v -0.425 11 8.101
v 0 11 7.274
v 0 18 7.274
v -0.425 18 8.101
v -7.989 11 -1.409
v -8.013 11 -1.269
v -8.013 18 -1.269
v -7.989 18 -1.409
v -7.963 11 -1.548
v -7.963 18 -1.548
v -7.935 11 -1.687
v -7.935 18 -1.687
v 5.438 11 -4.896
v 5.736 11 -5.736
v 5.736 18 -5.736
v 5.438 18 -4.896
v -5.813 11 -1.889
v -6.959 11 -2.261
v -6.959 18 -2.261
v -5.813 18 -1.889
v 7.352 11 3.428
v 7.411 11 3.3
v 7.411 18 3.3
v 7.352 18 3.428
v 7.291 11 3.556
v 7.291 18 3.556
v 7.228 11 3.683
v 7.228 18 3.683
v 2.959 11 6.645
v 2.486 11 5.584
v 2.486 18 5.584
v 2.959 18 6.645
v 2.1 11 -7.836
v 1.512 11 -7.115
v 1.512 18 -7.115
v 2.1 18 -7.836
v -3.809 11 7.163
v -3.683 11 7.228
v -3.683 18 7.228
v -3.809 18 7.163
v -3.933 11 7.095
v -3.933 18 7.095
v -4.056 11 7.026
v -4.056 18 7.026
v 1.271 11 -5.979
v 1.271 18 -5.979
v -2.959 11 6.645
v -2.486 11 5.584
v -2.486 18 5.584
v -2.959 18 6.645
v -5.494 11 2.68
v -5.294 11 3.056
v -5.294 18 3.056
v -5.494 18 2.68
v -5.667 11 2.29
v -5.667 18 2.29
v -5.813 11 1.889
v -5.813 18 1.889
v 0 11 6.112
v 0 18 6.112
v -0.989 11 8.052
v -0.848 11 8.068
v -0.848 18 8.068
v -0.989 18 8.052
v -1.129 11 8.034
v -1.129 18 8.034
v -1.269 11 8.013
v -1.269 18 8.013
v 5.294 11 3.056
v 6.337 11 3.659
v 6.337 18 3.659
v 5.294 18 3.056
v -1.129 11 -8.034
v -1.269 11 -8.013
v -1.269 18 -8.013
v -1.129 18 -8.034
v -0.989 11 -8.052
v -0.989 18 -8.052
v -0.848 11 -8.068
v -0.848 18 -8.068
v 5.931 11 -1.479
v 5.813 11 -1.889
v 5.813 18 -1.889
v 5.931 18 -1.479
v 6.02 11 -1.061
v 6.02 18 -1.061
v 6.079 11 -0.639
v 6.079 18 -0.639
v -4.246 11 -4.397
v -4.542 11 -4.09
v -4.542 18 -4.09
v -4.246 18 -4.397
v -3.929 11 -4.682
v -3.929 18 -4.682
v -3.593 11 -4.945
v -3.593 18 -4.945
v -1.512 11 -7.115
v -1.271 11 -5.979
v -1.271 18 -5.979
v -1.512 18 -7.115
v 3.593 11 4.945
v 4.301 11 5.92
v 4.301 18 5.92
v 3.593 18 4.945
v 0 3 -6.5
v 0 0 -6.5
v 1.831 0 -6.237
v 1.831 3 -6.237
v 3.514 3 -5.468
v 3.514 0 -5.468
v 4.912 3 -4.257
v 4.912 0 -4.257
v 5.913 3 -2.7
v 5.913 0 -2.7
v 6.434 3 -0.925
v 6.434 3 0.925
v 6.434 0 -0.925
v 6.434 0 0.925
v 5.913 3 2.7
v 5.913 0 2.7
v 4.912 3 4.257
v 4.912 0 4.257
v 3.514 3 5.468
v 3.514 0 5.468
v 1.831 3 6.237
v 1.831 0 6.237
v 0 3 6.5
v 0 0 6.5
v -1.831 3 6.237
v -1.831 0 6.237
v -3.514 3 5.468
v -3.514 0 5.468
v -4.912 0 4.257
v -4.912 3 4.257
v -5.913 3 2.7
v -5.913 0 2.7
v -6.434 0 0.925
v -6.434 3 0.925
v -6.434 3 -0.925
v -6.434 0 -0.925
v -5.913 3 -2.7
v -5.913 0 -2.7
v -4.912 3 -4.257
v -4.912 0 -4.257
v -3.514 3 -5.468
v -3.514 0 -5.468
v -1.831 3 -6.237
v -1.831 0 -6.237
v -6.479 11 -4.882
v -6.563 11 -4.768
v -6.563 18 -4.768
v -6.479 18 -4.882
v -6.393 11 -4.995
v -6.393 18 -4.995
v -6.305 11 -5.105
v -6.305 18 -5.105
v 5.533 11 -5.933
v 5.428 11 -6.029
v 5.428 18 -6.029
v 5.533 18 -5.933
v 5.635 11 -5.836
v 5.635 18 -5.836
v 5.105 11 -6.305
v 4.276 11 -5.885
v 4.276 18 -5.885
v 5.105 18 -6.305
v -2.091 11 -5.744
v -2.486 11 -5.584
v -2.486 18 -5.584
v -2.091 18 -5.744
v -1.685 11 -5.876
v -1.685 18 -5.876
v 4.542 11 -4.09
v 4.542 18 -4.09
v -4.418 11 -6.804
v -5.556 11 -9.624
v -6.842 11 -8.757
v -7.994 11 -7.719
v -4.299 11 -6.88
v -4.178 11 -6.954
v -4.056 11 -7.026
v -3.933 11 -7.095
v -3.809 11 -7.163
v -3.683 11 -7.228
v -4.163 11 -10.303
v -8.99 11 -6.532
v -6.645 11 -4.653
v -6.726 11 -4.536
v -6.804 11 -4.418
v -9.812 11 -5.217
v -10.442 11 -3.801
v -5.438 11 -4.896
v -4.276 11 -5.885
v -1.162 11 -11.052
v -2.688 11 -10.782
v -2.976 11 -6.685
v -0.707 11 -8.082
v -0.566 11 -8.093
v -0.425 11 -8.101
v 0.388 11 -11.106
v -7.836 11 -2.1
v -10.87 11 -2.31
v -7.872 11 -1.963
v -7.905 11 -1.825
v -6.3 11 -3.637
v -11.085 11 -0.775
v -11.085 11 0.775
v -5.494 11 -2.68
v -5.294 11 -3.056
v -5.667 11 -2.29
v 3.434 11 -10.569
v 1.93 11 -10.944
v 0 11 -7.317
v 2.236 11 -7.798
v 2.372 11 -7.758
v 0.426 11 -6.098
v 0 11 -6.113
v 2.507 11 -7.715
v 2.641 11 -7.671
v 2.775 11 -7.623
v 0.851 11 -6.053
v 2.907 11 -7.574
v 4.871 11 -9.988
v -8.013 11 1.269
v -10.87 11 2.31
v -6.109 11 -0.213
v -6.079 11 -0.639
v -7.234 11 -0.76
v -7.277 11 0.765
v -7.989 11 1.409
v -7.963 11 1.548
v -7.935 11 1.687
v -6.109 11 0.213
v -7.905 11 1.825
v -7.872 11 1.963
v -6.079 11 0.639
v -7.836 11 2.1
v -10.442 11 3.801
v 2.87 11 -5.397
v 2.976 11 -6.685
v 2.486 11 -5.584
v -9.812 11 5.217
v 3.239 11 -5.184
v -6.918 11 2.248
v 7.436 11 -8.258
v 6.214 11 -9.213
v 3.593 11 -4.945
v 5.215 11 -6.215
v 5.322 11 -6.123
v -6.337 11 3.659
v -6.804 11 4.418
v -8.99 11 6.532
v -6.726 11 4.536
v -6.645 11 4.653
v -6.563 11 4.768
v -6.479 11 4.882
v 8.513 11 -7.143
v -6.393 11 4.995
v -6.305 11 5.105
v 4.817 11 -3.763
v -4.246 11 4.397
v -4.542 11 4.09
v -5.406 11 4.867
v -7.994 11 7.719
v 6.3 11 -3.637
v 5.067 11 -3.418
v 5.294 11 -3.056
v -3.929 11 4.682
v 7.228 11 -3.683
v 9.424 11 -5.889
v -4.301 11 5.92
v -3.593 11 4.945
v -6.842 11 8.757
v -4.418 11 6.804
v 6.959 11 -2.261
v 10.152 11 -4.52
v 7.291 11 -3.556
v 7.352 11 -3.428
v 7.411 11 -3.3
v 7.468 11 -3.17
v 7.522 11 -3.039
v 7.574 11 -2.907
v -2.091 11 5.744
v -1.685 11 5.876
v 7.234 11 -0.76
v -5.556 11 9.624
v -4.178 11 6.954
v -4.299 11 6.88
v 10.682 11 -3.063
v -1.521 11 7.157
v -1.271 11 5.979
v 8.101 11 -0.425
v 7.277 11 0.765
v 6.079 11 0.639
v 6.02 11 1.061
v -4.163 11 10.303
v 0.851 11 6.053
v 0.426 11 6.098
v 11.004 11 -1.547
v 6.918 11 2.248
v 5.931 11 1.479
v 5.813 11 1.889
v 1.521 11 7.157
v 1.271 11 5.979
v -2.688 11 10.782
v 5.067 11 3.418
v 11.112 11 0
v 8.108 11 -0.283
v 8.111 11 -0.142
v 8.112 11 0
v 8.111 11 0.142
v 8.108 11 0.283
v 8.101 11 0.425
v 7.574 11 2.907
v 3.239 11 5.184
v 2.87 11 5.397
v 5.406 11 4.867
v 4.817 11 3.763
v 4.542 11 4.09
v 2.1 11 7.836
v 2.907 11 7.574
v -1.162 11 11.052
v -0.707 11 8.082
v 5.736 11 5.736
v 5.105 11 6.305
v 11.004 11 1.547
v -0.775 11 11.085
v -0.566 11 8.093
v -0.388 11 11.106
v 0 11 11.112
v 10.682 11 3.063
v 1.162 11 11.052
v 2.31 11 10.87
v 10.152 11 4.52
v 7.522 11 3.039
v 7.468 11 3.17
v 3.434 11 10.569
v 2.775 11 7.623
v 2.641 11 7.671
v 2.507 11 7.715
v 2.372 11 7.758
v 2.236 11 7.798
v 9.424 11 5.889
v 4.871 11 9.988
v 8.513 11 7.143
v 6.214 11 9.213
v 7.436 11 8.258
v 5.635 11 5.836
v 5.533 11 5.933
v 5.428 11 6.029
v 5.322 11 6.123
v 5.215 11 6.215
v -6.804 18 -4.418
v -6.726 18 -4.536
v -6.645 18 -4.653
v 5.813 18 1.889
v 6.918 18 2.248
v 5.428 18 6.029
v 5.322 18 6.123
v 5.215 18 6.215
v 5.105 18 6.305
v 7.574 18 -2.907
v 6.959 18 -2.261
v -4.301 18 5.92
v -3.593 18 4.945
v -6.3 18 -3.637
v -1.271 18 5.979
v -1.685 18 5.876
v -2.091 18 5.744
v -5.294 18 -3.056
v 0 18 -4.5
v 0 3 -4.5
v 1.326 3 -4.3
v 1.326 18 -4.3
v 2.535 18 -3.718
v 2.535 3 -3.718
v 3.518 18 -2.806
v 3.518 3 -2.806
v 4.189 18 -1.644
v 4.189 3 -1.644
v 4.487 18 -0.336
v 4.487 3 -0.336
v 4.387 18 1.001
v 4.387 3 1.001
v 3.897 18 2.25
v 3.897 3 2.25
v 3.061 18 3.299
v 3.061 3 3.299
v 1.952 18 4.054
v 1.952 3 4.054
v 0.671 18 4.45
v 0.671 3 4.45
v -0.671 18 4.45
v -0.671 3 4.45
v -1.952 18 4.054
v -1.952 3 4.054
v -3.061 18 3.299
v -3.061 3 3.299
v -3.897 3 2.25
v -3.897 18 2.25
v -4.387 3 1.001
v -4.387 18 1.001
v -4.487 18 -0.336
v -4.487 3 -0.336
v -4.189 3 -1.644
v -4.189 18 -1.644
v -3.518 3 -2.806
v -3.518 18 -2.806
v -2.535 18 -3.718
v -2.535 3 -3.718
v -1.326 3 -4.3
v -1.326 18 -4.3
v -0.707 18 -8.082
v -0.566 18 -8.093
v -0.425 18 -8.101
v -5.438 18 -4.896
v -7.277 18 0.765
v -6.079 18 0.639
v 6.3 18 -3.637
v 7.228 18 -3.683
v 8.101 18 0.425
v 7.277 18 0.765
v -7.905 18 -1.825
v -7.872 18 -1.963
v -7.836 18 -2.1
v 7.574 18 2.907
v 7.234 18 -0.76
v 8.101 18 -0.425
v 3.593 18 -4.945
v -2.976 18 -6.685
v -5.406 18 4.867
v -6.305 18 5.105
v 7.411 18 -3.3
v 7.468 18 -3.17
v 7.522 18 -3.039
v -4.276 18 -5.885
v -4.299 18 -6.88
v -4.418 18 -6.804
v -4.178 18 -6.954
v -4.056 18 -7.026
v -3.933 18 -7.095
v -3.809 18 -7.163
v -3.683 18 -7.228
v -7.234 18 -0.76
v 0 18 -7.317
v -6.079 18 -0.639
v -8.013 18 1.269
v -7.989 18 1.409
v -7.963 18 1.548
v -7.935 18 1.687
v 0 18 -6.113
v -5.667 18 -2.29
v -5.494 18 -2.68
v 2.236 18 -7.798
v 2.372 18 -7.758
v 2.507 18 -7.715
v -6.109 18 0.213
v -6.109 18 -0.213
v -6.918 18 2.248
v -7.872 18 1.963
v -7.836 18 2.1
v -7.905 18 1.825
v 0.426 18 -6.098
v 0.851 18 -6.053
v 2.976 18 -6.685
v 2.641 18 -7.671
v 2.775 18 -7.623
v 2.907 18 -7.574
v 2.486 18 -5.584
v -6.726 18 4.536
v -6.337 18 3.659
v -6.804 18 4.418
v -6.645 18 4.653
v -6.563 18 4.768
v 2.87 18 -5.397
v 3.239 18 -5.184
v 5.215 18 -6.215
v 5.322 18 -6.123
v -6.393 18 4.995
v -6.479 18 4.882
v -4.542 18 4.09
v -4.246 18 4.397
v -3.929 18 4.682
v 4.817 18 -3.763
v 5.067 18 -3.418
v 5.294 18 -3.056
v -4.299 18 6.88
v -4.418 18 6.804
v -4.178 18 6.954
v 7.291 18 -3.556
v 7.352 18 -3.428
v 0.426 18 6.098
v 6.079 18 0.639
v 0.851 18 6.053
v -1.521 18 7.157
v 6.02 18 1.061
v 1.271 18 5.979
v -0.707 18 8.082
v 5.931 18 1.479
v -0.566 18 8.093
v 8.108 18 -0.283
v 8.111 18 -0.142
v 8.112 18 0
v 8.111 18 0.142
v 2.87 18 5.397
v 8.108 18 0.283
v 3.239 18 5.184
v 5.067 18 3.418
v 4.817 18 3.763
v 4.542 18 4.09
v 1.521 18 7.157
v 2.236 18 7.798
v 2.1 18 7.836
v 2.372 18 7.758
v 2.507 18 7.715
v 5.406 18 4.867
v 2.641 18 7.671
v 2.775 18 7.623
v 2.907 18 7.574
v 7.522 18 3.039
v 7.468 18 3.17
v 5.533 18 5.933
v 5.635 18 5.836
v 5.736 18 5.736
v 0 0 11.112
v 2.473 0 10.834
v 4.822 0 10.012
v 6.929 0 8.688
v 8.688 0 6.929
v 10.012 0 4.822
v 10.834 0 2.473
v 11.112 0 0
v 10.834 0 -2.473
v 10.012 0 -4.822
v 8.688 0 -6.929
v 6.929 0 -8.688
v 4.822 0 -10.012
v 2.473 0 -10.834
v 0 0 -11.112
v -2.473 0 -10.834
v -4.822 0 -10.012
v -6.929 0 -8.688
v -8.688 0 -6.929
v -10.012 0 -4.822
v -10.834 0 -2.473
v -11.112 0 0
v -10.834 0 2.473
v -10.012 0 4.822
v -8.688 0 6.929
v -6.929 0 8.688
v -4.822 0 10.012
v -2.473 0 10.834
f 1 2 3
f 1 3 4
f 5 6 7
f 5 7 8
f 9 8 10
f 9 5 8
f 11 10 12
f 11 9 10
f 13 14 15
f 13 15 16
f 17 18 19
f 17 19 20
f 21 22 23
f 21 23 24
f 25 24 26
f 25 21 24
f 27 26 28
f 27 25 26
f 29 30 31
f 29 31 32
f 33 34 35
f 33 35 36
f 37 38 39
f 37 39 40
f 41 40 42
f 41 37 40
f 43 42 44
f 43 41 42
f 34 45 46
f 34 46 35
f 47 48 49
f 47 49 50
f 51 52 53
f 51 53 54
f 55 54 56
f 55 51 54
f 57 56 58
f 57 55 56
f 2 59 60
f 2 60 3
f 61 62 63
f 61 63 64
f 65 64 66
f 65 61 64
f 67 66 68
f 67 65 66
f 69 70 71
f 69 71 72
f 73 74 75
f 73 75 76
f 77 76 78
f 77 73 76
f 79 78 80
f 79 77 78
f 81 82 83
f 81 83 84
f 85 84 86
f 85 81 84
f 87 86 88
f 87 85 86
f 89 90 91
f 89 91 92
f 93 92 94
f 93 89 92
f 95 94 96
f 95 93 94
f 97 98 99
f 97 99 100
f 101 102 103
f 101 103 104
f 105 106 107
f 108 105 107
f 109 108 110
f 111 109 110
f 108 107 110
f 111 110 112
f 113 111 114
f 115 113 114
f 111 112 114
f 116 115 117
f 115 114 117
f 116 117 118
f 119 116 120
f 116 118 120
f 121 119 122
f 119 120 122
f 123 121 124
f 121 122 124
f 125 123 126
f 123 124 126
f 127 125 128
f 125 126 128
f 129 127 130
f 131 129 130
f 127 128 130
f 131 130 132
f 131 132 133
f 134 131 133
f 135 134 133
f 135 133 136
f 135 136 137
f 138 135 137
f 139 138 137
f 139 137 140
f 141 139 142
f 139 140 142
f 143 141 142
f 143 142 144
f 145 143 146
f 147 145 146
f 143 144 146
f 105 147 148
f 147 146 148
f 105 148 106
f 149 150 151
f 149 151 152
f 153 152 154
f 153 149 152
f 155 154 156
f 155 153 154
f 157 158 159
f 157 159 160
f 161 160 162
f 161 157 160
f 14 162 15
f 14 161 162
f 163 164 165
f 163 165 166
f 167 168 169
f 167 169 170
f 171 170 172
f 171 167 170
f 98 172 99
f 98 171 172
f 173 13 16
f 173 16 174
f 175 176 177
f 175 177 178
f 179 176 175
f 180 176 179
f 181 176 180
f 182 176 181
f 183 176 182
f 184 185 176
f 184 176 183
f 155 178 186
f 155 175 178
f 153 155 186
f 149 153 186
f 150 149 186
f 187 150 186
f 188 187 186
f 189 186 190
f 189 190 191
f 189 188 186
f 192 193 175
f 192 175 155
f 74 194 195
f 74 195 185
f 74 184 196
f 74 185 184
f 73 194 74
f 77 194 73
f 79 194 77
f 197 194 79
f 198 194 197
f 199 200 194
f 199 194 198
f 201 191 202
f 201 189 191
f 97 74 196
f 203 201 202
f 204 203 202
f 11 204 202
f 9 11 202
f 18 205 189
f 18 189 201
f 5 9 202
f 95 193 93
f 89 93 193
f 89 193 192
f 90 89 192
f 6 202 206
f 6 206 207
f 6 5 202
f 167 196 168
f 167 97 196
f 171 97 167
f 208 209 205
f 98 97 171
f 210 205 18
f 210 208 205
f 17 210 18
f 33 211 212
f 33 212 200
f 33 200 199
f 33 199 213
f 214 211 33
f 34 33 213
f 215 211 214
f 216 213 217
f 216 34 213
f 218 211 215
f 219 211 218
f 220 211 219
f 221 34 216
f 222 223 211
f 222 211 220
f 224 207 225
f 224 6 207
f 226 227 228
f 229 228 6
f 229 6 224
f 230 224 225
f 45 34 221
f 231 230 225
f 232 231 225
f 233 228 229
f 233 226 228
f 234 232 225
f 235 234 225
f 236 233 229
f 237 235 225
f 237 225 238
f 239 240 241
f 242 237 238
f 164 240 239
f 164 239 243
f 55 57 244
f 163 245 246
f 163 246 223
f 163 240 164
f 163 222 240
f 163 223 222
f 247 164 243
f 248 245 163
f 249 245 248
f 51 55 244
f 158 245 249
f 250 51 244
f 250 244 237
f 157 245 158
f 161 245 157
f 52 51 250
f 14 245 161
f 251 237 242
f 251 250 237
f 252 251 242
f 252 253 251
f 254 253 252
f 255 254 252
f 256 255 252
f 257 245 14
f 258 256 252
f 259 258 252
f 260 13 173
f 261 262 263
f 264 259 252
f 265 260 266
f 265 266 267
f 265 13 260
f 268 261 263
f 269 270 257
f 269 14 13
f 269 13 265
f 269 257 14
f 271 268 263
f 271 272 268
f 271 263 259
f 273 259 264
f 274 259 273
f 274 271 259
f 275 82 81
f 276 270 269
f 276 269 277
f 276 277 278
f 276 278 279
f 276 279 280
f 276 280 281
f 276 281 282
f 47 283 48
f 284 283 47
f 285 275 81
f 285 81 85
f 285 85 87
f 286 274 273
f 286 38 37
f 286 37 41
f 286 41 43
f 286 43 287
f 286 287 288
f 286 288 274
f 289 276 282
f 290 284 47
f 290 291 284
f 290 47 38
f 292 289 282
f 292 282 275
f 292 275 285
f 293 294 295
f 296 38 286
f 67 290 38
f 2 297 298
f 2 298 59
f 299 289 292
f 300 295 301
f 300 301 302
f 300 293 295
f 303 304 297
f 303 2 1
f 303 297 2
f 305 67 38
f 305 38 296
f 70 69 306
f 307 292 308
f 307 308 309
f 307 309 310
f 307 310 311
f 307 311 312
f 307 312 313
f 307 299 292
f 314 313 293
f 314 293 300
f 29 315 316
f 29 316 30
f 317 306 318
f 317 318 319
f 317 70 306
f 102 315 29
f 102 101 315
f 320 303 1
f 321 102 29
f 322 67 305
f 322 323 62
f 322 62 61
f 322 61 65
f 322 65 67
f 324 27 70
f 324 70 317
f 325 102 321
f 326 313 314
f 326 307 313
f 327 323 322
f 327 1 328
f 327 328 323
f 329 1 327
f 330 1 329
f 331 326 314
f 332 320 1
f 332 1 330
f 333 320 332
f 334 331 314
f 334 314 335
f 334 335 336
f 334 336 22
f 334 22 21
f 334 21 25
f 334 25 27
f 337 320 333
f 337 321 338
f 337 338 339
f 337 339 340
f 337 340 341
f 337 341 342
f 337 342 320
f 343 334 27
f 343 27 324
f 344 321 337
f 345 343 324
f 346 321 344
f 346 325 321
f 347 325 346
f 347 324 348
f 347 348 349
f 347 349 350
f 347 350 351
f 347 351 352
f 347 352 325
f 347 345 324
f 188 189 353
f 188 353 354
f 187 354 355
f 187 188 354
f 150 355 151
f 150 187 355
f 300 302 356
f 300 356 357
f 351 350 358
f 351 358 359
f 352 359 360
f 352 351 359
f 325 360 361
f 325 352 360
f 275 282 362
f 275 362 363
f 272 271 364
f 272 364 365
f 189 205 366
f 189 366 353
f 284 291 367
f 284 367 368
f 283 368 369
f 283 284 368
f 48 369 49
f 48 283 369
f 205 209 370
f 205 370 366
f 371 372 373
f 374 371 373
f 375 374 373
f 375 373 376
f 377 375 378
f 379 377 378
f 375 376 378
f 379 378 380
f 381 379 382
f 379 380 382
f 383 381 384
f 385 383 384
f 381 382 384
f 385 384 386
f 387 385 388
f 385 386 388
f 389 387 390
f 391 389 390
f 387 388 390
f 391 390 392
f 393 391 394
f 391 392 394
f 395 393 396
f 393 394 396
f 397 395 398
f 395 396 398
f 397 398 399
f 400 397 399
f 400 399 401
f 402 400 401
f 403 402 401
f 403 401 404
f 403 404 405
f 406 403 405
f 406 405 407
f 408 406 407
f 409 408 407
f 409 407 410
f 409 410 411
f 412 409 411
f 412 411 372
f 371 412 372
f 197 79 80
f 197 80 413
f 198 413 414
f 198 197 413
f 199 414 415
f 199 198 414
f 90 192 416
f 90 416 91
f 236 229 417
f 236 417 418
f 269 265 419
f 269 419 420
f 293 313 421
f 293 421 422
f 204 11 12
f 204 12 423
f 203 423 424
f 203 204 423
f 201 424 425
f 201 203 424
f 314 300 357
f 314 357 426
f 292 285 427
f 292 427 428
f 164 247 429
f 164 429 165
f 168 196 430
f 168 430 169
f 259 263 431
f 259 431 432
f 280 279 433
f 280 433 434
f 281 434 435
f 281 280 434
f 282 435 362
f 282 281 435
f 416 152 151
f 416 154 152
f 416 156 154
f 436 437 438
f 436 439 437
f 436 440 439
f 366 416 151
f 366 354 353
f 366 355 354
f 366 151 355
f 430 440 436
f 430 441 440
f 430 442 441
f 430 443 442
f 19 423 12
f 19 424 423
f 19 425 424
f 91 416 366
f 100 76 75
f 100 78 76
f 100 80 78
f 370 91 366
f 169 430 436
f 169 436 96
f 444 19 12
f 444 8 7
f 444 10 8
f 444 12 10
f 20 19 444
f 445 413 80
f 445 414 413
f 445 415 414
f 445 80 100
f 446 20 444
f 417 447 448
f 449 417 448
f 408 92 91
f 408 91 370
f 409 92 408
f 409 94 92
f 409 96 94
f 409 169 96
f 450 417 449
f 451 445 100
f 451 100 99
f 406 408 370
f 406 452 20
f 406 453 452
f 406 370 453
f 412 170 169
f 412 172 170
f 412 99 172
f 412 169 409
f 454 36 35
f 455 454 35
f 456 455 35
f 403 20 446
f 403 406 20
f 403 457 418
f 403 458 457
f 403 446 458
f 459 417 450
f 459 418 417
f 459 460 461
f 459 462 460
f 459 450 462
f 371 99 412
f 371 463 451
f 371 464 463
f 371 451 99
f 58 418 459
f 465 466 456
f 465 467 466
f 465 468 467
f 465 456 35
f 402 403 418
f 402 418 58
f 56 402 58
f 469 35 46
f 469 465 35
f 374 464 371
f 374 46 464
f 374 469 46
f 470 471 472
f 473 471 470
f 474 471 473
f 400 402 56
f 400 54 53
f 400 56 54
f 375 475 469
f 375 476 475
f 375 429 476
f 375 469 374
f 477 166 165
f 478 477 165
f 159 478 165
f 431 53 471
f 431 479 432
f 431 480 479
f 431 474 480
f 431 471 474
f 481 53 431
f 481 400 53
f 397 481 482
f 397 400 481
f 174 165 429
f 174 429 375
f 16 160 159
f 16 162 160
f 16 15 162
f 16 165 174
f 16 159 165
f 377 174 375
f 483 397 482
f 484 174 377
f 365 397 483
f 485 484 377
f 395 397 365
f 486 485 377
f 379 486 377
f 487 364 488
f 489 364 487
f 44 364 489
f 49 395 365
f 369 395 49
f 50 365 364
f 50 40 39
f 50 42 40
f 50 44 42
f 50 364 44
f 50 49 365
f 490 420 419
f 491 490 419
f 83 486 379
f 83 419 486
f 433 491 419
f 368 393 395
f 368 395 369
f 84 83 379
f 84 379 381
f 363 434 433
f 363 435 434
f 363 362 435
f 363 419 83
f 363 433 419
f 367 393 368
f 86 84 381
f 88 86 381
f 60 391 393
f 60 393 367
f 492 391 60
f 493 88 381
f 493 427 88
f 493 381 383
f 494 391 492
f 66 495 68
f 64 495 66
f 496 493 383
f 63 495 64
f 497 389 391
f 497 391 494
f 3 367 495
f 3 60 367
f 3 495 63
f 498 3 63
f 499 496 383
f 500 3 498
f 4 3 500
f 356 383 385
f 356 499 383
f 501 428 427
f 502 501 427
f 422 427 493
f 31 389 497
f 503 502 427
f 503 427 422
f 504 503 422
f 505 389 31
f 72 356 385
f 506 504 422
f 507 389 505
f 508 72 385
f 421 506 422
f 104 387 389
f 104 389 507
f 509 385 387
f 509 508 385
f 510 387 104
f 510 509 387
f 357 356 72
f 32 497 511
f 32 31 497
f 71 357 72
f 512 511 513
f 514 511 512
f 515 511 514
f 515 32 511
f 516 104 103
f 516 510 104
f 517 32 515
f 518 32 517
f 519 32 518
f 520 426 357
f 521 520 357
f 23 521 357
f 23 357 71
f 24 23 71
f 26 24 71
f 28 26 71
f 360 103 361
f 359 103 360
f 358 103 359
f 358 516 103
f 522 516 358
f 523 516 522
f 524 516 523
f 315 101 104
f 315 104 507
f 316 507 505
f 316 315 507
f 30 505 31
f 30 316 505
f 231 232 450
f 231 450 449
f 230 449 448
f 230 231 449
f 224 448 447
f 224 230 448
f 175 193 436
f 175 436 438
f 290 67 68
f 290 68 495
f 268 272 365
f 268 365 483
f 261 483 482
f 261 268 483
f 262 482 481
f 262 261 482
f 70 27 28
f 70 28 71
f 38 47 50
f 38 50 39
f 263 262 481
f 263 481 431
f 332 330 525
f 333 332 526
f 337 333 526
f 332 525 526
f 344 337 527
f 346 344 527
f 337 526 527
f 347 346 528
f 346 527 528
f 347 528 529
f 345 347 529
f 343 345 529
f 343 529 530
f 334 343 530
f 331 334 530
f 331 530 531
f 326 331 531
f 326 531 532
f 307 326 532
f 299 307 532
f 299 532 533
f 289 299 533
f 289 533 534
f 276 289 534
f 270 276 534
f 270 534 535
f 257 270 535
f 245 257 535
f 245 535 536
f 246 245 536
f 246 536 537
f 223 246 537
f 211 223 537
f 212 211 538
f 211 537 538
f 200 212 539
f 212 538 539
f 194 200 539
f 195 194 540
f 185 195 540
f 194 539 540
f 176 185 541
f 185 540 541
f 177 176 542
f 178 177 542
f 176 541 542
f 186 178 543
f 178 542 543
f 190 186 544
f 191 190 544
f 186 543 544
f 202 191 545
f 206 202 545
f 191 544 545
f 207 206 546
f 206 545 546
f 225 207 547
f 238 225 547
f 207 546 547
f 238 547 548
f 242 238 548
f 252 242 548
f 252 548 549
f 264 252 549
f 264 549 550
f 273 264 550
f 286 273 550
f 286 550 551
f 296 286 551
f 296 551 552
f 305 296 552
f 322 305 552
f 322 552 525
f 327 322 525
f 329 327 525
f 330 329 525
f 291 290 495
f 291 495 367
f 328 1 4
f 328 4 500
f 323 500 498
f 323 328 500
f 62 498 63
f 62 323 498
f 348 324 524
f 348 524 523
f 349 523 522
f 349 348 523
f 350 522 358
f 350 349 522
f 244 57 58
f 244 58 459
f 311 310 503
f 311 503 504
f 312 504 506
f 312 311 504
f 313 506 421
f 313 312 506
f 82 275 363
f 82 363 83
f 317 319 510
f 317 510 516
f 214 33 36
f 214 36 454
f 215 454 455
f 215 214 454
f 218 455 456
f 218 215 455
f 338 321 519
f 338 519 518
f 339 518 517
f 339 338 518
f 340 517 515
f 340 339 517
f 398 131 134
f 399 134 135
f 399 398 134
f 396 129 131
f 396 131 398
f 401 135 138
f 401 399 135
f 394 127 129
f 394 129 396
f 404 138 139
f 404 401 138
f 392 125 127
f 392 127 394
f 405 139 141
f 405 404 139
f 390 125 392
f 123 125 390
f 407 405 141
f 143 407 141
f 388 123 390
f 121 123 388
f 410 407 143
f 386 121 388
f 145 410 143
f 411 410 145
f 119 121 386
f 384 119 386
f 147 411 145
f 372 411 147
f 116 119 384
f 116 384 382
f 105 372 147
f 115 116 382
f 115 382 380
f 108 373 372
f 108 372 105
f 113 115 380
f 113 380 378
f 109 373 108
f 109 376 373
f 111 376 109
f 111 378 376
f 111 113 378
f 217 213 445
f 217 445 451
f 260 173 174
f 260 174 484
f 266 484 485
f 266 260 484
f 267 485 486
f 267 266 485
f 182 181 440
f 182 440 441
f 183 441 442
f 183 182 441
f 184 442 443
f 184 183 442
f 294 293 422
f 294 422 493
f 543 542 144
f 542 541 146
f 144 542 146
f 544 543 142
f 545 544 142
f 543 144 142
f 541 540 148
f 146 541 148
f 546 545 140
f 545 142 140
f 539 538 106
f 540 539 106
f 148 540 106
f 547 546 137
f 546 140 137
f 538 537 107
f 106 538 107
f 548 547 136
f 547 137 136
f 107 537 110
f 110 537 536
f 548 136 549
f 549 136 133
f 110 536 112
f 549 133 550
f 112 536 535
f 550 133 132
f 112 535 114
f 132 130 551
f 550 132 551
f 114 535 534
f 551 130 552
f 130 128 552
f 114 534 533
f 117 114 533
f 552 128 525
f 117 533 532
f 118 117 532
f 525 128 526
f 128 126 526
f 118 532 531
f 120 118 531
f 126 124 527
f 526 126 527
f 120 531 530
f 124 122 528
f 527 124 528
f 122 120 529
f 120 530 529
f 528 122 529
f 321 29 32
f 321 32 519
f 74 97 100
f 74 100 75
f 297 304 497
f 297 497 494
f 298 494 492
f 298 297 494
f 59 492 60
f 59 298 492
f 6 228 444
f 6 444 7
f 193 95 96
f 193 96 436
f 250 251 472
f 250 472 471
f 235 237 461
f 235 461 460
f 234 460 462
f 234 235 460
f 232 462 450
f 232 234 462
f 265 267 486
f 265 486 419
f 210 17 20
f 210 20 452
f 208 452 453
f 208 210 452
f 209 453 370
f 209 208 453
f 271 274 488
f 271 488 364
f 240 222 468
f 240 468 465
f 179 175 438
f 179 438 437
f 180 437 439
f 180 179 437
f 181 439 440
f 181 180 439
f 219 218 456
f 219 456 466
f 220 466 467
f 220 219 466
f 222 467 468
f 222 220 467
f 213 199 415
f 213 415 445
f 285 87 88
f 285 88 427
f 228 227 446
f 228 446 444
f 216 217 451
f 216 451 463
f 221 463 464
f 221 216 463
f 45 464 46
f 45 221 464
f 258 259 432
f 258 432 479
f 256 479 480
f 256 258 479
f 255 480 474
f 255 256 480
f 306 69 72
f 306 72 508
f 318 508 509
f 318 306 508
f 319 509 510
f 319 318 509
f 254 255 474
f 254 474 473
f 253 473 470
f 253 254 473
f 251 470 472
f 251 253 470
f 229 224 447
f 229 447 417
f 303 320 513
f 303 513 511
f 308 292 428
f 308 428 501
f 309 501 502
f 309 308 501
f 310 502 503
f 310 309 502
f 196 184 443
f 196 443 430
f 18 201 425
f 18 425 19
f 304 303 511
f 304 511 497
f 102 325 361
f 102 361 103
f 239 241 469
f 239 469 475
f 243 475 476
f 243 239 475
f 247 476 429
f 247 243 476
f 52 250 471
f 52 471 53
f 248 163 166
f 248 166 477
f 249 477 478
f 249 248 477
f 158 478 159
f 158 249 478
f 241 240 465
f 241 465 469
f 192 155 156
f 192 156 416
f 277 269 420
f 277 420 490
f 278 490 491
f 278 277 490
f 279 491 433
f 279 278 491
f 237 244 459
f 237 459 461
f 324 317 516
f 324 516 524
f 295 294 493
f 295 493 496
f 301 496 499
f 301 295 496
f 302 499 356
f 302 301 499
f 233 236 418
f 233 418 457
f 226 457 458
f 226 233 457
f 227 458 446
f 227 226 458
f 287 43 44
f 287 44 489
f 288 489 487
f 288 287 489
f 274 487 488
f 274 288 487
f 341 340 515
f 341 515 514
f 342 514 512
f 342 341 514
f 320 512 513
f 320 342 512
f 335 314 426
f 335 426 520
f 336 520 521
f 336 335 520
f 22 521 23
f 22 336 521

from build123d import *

# Parameters (mm, degrees)
SKETCH1_R           = 11.1125
BOSS_EXTRUDE1_DEPTH = 18
CUT_EXTRUDE2_START  = -7
CUT_EXTRUDE2_DEPTH  = 7
CIRPATTERN1_COUNT   = 15
SKETCH3_R           = 6.5
CUT_EXTRUDE3_DEPTH  = 3
SKETCH4_R           = 4.5
CUT_EXTRUDE4_DEPTH  = 22.724992808


with BuildPart() as part:
    # Sketch1 → Boss-Extrude1 (new body)
    with BuildSketch(Plane(origin=(0, 0, 0), x_dir=(1, 0, 0), z_dir=(0, 1, 0))):
        with Locations(Location((0, 0, 0), (0, 0, 270))):
            Circle(SKETCH1_R)
    extrude(amount=BOSS_EXTRUDE1_DEPTH)

    # Sketch2 → Cut-Extrude2 (cut)
    with BuildSketch(Plane(origin=(0, 18, 0), x_dir=(1, 0, 0), z_dir=(0, 1, 0)).offset(CUT_EXTRUDE2_START)):
        with BuildLine():
            Line((10.151773898, 4.519860946), (7.411137525, 3.299651017))
            ThreePointArc((7.411137525, 3.299651017), (7.494972707, 3.104519345), (7.57367121, 2.907259991))
            Line((7.57367121, 2.907259991), (6.959086209, 2.261144177))
            Line((6.959086209, 2.261144177), (5.813332956, 1.888866378))
            ThreePointArc((5.813332956, 1.888866378), (5.978927209, 1.27086021), (6.079015085, 0.638930232))
            Line((6.079015085, 0.638930232), (7.234212217, 0.760346343))
            Line((7.234212217, 0.760346343), (8.101382101, 0.424575445))
            ThreePointArc((8.101382101, 0.424575445), (8.109720049, 0.212360493), (8.1125, 0))
            Line((8.1125, 0), (11.1125, 0))
            ThreePointArc((11.1125, 0), (10.869665213, 2.310418664), (10.151773898, 4.519860946))
        make_face()
    cut_extrude2 = extrude(amount=CUT_EXTRUDE2_DEPTH, mode=Mode.SUBTRACT)

    # CirPattern1: Cut-Extrude2 ×15 about axis
    cirpattern1_axis = Axis((0, 0, 0), (0, 1, 0))
    for i in range(1, CIRPATTERN1_COUNT):
        add(cut_extrude2.rotate(cirpattern1_axis, i * 360 / CIRPATTERN1_COUNT), mode=Mode.SUBTRACT)

    # Sketch3 → Cut-Extrude3 (cut)
    with BuildSketch(Plane.XZ):
        with Locations(Location((0, 0, 0), (0, 0, 270))):
            Circle(SKETCH3_R)
    extrude(amount=-CUT_EXTRUDE3_DEPTH, mode=Mode.SUBTRACT)

    # Sketch4 → Cut-Extrude4 (cut, through all)
    with BuildSketch(Plane.XZ.offset(-3)):
        with Locations(Location((0, 0, 0), (0, 0, 270))):
            Circle(SKETCH4_R)
    extrude(amount=-CUT_EXTRUDE4_DEPTH, mode=Mode.SUBTRACT)


solid = part.part
